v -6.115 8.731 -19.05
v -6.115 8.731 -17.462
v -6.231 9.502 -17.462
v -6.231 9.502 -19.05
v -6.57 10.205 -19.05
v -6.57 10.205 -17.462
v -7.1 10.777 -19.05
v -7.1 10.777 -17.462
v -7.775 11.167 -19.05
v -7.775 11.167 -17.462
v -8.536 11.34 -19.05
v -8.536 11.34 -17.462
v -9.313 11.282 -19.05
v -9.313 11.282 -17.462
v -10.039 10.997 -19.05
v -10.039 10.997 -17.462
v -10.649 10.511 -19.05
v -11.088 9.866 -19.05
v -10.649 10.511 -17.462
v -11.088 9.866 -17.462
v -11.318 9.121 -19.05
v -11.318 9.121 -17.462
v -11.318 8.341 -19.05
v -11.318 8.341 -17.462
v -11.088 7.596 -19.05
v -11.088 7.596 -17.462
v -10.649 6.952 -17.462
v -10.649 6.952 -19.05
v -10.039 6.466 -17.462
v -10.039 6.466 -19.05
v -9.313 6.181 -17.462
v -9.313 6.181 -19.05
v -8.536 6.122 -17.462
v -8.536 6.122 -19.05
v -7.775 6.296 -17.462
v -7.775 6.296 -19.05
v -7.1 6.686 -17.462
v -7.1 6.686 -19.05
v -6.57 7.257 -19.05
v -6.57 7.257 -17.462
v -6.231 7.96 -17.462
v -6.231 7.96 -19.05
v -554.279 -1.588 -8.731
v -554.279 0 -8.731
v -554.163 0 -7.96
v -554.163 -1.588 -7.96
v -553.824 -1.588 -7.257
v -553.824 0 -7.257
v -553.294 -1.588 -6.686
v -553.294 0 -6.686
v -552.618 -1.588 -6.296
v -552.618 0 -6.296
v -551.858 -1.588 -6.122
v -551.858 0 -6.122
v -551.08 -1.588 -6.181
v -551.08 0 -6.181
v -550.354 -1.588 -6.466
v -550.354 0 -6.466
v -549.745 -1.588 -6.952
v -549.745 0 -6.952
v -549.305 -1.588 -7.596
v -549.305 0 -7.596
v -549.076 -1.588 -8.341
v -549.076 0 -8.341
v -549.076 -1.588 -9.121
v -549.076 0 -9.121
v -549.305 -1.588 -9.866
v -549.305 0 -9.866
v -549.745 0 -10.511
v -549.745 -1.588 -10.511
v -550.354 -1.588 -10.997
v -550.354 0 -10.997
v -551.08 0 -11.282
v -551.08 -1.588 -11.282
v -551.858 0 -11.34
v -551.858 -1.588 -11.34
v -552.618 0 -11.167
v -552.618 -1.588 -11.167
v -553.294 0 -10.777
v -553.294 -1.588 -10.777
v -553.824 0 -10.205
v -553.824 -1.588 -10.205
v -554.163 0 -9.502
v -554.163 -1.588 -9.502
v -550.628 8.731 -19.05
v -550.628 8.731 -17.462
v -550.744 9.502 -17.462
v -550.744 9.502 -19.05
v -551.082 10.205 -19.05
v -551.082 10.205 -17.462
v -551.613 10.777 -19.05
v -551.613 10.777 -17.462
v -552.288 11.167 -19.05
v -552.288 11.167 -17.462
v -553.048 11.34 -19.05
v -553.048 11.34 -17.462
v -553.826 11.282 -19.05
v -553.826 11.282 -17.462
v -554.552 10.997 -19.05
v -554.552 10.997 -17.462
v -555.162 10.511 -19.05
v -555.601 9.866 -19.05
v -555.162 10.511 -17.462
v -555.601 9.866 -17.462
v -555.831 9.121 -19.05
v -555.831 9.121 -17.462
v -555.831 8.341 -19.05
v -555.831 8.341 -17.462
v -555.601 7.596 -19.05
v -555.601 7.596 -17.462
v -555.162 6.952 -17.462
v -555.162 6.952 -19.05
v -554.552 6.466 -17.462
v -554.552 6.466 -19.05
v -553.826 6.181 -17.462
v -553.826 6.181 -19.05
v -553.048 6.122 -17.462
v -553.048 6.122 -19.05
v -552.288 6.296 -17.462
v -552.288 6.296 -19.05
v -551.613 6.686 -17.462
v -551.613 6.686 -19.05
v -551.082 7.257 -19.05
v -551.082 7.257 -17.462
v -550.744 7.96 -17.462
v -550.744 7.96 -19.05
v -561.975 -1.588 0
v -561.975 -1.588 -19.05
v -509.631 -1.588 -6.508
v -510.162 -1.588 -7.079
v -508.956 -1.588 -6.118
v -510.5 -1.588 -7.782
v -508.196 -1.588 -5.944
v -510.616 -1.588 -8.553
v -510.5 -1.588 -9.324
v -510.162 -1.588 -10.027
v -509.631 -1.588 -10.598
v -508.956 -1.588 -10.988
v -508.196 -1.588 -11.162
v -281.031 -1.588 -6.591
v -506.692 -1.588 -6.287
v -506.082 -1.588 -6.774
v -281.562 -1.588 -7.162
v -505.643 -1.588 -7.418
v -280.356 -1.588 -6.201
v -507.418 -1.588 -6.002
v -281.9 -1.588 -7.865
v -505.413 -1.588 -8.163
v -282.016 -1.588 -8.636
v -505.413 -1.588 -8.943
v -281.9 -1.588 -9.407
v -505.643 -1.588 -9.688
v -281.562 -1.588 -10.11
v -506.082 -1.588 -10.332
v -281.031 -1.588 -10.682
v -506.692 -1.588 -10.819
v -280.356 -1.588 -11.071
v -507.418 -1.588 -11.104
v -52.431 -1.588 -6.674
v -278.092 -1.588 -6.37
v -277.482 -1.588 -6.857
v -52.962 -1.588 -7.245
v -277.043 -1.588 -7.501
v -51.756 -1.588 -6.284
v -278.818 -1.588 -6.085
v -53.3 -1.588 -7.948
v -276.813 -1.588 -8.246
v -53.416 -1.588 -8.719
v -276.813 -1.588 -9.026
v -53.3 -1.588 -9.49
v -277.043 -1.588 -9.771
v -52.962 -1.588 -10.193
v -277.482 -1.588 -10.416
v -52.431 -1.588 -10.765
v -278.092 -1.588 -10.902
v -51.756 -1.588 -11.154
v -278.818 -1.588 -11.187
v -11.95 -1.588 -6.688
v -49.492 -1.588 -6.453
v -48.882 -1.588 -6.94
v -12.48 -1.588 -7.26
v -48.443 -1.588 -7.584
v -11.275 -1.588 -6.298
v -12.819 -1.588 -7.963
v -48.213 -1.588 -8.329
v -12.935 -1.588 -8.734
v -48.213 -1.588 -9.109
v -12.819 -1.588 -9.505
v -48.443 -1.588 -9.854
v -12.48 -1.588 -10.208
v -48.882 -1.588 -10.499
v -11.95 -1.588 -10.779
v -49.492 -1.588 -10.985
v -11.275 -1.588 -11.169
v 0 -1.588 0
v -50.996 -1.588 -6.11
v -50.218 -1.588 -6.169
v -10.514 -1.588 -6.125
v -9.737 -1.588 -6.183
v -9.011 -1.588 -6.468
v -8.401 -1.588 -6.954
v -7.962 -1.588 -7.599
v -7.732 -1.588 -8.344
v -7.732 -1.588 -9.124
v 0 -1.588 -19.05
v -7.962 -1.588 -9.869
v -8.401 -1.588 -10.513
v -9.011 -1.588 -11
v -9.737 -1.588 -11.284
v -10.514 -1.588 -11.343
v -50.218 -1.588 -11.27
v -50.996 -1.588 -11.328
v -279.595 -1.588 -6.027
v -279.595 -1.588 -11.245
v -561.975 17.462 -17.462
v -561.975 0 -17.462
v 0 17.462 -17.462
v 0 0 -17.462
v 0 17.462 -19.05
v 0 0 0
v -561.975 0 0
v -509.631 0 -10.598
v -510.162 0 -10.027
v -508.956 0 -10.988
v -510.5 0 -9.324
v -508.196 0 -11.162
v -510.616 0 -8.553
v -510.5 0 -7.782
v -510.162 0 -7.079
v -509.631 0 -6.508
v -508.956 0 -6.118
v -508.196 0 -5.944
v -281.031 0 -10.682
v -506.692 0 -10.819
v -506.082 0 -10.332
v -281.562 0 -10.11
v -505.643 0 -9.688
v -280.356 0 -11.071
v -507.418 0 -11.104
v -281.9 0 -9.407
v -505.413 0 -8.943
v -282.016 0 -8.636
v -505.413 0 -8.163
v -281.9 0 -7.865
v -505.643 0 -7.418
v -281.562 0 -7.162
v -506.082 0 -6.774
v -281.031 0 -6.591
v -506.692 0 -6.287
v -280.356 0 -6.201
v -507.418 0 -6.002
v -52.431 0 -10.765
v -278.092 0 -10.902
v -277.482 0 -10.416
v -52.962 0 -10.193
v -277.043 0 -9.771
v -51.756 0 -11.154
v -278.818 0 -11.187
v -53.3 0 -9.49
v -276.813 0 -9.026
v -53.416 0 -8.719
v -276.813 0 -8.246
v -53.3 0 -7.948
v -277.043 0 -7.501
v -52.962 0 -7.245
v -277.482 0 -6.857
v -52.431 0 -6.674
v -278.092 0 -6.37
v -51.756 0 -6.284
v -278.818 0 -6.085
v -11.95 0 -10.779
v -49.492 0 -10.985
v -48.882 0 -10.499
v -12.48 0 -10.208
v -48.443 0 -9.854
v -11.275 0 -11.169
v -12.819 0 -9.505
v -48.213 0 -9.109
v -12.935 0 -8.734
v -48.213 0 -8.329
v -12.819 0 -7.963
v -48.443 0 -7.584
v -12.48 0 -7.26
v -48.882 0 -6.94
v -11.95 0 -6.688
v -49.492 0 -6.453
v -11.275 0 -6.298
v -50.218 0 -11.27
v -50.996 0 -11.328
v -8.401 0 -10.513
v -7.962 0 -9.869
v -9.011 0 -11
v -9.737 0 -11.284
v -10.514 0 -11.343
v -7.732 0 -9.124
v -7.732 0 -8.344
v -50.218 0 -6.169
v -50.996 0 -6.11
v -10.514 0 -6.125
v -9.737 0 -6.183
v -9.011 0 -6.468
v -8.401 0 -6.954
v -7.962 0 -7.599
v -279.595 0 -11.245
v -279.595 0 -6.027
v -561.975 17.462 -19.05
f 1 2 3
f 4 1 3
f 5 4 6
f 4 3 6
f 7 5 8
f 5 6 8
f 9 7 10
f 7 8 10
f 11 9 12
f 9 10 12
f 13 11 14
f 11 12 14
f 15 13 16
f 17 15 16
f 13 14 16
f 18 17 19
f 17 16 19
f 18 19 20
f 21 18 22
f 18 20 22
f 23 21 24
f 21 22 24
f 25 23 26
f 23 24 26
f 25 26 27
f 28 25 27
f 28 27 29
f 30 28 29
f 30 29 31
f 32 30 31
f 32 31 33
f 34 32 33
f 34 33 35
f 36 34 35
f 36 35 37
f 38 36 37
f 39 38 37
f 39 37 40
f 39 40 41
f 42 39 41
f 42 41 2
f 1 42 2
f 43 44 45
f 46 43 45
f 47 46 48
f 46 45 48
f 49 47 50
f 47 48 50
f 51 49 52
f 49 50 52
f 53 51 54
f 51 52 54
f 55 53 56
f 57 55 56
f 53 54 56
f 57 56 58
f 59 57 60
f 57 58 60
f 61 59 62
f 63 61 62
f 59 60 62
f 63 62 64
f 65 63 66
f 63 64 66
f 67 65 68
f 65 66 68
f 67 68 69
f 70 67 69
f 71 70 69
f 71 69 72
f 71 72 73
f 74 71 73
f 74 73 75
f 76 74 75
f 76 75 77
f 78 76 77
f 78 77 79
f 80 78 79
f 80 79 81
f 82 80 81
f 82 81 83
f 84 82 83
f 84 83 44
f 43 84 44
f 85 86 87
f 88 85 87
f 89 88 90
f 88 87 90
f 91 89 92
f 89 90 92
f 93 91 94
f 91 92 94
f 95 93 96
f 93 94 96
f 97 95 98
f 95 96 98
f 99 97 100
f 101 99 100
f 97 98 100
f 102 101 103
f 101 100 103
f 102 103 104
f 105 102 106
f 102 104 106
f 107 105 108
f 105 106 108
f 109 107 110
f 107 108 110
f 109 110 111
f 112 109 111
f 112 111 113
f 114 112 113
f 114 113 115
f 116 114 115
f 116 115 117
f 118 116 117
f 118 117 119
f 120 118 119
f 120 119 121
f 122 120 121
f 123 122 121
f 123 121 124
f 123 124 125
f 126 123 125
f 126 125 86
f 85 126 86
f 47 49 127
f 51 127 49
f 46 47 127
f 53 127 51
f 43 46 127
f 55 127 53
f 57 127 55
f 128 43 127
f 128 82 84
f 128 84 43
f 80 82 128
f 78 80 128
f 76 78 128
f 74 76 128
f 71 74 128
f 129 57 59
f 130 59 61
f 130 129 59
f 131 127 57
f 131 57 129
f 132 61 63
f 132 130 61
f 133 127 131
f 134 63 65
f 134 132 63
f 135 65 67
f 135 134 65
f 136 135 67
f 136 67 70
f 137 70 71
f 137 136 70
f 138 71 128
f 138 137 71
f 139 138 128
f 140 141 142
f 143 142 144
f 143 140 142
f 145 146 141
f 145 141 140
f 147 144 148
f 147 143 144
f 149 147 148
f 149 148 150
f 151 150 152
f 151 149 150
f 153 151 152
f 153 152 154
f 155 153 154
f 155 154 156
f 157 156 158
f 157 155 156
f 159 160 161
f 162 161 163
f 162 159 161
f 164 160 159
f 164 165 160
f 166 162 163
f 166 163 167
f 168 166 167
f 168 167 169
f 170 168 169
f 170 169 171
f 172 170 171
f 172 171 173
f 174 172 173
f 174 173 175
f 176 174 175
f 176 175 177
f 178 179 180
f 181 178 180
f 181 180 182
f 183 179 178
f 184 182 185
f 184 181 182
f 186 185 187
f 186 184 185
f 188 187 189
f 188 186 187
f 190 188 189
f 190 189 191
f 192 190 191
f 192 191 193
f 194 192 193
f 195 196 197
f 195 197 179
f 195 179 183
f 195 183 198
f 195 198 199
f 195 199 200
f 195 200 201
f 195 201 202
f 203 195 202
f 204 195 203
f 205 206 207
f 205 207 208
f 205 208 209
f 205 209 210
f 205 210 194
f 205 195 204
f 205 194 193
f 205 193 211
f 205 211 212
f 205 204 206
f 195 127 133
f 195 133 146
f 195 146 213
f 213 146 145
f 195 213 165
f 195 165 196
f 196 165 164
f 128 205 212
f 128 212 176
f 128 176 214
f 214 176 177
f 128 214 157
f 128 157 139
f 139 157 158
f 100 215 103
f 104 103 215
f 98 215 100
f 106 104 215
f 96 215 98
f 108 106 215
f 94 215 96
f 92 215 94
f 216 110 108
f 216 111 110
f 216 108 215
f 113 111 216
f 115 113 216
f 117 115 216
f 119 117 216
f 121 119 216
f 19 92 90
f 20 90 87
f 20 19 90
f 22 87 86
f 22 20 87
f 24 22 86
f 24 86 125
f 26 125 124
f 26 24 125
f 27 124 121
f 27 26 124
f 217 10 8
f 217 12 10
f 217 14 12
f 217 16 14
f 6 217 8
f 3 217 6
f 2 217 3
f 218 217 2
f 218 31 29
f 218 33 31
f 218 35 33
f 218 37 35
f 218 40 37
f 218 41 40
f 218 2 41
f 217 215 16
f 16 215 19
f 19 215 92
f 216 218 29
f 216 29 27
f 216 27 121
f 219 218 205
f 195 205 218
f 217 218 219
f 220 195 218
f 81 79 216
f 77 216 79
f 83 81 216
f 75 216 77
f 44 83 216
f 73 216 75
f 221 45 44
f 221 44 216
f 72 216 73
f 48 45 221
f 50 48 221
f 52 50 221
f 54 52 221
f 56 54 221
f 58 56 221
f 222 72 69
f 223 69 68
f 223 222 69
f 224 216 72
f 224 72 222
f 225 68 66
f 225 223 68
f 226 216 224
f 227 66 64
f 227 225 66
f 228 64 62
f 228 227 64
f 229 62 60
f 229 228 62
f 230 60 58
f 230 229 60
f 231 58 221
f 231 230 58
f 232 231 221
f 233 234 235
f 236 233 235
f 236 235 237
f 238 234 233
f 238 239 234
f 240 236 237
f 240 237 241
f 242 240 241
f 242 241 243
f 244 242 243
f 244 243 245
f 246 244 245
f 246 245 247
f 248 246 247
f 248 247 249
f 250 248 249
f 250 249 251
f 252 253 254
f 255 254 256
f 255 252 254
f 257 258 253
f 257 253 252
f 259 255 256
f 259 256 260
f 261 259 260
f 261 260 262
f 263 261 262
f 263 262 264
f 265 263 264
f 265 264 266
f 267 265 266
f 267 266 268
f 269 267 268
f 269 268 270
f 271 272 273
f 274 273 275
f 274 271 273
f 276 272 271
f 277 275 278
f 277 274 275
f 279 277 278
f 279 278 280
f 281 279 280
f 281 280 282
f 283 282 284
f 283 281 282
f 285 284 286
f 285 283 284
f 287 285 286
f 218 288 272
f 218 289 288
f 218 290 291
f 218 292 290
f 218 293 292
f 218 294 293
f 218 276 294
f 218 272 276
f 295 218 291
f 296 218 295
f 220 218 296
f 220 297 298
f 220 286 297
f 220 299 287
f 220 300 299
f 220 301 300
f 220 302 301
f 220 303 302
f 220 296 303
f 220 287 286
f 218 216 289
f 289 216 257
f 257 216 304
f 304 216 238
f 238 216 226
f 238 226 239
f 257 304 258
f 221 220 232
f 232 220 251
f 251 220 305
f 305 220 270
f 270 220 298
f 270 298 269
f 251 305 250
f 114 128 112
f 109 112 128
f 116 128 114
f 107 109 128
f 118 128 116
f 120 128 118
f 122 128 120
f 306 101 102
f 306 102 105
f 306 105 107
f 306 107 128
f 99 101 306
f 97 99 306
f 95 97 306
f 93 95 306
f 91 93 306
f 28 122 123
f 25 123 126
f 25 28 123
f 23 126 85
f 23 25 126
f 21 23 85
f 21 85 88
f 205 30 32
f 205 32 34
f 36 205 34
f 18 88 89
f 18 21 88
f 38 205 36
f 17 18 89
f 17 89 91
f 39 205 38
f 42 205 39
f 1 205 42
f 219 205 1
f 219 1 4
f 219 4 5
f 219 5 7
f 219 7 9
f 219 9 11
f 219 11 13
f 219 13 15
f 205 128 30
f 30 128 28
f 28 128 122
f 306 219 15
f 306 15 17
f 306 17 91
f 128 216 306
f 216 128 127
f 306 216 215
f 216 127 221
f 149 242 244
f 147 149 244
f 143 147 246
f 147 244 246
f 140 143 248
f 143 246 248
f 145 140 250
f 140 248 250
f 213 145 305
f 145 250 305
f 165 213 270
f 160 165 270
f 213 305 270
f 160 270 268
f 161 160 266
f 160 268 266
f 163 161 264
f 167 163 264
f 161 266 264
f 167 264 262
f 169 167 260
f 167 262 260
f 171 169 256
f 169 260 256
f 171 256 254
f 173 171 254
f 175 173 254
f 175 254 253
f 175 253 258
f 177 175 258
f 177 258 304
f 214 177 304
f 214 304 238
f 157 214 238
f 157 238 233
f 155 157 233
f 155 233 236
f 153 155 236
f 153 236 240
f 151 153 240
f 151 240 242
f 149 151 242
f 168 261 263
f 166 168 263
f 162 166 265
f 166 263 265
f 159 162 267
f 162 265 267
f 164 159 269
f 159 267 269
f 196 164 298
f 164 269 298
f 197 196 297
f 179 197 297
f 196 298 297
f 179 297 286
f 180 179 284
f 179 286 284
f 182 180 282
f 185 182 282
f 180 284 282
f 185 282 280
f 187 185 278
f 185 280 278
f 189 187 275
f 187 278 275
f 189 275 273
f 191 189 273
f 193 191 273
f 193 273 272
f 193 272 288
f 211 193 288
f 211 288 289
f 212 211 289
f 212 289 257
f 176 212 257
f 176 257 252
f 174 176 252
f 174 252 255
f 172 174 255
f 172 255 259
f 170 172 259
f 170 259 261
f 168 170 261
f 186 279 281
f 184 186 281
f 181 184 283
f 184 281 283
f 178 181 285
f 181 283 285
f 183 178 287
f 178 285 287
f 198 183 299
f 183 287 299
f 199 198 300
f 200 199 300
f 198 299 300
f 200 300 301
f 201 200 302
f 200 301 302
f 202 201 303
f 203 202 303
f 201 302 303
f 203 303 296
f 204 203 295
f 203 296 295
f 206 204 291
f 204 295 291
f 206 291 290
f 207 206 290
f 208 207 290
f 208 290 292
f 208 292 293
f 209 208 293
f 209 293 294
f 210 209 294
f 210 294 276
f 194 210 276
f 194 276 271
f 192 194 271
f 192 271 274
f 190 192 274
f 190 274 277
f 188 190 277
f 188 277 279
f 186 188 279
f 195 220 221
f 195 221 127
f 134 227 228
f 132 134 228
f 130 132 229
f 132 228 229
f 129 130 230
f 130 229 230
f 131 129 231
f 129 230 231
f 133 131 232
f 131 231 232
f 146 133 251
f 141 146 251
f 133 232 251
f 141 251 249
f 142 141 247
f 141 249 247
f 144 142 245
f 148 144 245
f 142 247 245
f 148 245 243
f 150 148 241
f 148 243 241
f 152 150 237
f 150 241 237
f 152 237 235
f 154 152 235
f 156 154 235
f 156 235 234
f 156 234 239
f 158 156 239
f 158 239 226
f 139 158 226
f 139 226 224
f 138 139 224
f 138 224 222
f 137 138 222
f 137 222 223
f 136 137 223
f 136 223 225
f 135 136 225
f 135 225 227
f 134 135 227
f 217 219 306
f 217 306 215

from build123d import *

# Parameters (mm, degrees)
F1_DEPTH = 561.975
F2_R     = 2.6162
F4_DEPTH = 25.4
F3_R     = 2.6162
F5_DEPTH = 25.4


with BuildPart() as f1:
    # F0 (on Right) → F1 (new body)
    with BuildSketch(Plane.YZ):
        Polygon((0, -17.4625), (0, 0), (-1.5875, 0), (-1.5875, -19.05), (17.4625, -19.05), (17.4625, -17.4625), align=None)
    extrude(amount=-F1_DEPTH)

    # F2 (on face) → F4 (cut)
    with BuildSketch(Plane(origin=(0, 0, 0), x_dir=(-1, 0, 0), z_dir=(0, 1, 0))):
        with Locations((10.31875, -8.733851)):
            Circle(F2_R)
        with Locations((279.399963, -8.636074)):
            Circle(F2_R)
        with Locations((551.6626, -8.73125)):
            Circle(F2_R)
        with Locations((508, -8.553008)):
            Circle(F2_R)
        with Locations((50.8, -8.719141)):
            Circle(F2_R)
    extrude(amount=-F4_DEPTH, mode=Mode.SUBTRACT)

    # F3 (on face) → F5 (cut)
    with BuildSketch(Plane.XY.offset(-17.4625)):
        with Locations((-8.73125, 8.73125)):
            Circle(F3_R)
        with Locations((-553.24375, 8.73125)):
            Circle(F3_R)
    extrude(amount=-F5_DEPTH, mode=Mode.SUBTRACT)


solid = f1.part
